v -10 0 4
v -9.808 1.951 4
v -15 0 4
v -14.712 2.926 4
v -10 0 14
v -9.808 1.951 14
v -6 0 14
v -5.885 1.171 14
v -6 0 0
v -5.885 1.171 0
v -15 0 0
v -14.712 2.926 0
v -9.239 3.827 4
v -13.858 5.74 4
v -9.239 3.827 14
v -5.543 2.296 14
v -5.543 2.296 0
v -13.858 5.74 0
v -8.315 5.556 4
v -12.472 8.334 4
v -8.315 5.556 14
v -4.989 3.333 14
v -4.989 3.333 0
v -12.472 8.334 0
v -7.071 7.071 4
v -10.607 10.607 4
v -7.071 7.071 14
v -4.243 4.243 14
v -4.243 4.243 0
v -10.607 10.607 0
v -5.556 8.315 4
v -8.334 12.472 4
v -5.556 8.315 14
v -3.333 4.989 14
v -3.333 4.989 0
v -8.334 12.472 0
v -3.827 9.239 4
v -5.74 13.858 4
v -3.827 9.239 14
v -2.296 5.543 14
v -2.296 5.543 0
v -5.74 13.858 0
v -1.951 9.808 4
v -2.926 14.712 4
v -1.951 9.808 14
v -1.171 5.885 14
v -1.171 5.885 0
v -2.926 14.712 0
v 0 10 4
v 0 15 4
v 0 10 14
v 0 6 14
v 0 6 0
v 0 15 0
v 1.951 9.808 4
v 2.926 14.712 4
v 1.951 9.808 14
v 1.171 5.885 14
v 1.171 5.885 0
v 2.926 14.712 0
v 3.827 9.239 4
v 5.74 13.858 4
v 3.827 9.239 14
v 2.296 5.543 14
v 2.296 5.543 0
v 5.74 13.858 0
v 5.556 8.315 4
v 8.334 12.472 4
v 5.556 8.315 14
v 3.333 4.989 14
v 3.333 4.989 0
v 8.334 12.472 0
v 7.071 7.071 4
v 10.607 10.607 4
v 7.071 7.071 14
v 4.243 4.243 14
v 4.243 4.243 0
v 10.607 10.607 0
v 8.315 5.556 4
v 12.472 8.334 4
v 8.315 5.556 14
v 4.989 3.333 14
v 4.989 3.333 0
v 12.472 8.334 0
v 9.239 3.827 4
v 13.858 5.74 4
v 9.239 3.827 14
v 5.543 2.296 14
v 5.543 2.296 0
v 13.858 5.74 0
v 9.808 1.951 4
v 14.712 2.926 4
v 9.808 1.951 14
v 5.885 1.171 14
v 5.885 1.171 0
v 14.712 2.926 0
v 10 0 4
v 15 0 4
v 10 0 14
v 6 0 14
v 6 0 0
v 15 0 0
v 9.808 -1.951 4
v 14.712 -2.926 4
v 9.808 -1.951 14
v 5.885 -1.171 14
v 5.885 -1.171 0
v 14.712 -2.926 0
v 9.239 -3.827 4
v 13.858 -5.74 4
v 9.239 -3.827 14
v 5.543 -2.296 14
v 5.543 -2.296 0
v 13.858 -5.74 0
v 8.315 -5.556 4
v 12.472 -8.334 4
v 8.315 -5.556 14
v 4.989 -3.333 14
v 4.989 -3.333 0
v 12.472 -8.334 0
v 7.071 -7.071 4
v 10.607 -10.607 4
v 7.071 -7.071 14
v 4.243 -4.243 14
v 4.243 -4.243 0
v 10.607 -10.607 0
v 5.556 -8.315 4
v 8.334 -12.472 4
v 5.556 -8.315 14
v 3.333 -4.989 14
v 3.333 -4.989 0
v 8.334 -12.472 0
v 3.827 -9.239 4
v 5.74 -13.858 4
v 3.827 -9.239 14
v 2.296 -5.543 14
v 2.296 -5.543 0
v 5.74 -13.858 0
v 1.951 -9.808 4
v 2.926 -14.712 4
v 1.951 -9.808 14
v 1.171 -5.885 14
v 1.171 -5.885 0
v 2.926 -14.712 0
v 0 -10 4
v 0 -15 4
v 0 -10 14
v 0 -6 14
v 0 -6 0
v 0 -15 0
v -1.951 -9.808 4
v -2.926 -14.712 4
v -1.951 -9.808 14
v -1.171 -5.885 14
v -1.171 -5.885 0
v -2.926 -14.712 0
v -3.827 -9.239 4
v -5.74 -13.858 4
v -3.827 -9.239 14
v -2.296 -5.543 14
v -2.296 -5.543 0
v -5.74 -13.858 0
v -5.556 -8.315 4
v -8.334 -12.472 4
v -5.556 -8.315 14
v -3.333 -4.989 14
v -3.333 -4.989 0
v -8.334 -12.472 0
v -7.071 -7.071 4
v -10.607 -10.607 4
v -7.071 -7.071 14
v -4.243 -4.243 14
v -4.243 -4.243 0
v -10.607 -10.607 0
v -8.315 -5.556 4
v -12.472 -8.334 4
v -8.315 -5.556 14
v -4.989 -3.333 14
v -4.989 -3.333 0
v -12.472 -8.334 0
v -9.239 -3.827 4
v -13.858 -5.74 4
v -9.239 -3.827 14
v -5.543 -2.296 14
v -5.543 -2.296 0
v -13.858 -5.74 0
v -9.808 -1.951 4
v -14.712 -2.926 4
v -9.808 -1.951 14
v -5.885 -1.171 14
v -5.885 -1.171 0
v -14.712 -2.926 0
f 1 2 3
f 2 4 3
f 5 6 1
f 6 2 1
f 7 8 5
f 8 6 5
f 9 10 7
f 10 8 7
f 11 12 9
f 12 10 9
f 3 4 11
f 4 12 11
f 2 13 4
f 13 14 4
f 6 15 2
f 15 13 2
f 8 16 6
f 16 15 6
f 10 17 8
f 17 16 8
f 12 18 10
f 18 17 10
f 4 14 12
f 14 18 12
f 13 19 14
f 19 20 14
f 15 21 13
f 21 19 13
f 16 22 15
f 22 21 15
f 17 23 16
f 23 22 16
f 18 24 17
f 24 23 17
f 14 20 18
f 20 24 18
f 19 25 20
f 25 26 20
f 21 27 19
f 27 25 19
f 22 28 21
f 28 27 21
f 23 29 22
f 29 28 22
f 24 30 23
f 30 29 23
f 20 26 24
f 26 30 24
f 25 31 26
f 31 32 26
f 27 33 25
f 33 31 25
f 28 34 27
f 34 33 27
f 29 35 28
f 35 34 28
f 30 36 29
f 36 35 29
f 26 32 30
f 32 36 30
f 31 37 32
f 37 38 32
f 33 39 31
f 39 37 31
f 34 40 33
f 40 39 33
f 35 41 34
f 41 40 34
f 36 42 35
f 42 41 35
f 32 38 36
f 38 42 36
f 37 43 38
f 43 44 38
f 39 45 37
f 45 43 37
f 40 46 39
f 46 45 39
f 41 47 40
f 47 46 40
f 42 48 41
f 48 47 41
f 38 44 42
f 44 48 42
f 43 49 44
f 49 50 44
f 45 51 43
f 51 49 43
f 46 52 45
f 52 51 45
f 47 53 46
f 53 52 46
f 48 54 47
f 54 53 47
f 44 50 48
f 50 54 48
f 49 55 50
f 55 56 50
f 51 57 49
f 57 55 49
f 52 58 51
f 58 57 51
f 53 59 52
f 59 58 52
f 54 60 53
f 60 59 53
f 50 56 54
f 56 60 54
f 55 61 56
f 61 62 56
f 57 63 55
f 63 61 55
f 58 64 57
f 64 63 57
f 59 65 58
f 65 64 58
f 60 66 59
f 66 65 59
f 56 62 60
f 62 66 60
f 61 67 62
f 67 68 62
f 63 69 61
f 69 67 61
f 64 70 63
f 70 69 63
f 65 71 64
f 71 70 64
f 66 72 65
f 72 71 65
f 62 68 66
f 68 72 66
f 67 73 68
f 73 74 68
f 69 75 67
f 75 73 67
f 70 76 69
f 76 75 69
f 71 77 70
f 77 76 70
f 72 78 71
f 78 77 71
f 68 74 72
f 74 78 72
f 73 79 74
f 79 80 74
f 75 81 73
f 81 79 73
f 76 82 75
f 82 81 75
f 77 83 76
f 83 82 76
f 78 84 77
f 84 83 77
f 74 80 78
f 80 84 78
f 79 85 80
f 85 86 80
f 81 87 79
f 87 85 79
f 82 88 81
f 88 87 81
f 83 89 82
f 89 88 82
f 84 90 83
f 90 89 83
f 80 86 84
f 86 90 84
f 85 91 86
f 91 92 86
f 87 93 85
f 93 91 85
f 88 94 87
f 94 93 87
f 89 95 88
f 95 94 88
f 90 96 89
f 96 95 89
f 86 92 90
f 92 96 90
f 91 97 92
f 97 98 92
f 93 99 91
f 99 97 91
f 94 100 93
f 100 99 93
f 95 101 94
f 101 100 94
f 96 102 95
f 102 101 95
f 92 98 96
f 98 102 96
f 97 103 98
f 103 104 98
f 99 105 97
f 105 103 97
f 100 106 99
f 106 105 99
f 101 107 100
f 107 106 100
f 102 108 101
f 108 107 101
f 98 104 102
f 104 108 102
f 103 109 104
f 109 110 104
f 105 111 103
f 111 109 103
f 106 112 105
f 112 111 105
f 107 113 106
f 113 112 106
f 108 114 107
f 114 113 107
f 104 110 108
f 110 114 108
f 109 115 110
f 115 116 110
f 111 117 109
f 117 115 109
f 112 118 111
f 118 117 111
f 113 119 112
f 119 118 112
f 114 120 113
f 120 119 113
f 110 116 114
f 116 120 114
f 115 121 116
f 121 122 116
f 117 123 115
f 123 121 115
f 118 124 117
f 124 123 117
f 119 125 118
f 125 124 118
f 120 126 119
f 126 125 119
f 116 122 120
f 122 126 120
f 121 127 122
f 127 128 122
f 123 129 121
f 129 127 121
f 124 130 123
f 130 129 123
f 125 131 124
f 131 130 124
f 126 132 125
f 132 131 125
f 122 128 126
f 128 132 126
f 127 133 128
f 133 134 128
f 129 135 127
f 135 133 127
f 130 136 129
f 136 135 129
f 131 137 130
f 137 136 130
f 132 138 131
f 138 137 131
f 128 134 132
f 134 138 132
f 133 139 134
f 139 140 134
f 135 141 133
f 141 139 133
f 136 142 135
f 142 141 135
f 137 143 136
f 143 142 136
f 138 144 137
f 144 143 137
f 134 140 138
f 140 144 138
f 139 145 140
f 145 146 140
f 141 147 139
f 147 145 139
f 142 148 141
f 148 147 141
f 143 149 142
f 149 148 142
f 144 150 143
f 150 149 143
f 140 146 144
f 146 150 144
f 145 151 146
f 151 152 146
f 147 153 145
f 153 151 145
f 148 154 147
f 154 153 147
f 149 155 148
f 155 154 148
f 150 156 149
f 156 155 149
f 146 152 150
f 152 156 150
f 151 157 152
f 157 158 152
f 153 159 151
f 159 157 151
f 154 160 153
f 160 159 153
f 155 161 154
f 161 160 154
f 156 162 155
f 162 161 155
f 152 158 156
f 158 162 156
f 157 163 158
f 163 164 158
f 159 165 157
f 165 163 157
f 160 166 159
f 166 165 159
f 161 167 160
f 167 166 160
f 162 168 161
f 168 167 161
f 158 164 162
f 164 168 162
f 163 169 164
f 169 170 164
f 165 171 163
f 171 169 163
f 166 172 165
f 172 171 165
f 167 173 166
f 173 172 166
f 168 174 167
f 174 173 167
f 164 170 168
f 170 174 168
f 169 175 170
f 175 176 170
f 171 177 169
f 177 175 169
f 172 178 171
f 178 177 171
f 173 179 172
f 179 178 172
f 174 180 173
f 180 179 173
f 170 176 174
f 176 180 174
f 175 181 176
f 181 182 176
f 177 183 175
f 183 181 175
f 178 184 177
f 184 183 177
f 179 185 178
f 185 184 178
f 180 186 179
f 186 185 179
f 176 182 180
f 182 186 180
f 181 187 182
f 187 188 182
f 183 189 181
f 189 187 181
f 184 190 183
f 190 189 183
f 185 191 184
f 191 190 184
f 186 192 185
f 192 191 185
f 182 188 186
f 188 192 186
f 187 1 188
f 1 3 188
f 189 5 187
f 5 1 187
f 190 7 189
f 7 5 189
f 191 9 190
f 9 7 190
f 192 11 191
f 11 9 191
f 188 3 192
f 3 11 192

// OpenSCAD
$fn = 32;

// ----------------------------------------------------------------------
// Arc stop: collar, 14 mm thick
// ----------------------------------------------------------------------

// --- parameters (mm) ---
revolve_angle = 360;      // full turn around the Z axis
profile_points = 6;       // points of the closed outline

profile = [[6, 0], [15, 0], [15, 4], [10, 4], [10, 14], [6, 14]];  // single closed polygon, 6 points, counter clockwise

// --- the one profile operation ---
rotate_extrude(angle = revolve_angle) polygon(points = profile);
